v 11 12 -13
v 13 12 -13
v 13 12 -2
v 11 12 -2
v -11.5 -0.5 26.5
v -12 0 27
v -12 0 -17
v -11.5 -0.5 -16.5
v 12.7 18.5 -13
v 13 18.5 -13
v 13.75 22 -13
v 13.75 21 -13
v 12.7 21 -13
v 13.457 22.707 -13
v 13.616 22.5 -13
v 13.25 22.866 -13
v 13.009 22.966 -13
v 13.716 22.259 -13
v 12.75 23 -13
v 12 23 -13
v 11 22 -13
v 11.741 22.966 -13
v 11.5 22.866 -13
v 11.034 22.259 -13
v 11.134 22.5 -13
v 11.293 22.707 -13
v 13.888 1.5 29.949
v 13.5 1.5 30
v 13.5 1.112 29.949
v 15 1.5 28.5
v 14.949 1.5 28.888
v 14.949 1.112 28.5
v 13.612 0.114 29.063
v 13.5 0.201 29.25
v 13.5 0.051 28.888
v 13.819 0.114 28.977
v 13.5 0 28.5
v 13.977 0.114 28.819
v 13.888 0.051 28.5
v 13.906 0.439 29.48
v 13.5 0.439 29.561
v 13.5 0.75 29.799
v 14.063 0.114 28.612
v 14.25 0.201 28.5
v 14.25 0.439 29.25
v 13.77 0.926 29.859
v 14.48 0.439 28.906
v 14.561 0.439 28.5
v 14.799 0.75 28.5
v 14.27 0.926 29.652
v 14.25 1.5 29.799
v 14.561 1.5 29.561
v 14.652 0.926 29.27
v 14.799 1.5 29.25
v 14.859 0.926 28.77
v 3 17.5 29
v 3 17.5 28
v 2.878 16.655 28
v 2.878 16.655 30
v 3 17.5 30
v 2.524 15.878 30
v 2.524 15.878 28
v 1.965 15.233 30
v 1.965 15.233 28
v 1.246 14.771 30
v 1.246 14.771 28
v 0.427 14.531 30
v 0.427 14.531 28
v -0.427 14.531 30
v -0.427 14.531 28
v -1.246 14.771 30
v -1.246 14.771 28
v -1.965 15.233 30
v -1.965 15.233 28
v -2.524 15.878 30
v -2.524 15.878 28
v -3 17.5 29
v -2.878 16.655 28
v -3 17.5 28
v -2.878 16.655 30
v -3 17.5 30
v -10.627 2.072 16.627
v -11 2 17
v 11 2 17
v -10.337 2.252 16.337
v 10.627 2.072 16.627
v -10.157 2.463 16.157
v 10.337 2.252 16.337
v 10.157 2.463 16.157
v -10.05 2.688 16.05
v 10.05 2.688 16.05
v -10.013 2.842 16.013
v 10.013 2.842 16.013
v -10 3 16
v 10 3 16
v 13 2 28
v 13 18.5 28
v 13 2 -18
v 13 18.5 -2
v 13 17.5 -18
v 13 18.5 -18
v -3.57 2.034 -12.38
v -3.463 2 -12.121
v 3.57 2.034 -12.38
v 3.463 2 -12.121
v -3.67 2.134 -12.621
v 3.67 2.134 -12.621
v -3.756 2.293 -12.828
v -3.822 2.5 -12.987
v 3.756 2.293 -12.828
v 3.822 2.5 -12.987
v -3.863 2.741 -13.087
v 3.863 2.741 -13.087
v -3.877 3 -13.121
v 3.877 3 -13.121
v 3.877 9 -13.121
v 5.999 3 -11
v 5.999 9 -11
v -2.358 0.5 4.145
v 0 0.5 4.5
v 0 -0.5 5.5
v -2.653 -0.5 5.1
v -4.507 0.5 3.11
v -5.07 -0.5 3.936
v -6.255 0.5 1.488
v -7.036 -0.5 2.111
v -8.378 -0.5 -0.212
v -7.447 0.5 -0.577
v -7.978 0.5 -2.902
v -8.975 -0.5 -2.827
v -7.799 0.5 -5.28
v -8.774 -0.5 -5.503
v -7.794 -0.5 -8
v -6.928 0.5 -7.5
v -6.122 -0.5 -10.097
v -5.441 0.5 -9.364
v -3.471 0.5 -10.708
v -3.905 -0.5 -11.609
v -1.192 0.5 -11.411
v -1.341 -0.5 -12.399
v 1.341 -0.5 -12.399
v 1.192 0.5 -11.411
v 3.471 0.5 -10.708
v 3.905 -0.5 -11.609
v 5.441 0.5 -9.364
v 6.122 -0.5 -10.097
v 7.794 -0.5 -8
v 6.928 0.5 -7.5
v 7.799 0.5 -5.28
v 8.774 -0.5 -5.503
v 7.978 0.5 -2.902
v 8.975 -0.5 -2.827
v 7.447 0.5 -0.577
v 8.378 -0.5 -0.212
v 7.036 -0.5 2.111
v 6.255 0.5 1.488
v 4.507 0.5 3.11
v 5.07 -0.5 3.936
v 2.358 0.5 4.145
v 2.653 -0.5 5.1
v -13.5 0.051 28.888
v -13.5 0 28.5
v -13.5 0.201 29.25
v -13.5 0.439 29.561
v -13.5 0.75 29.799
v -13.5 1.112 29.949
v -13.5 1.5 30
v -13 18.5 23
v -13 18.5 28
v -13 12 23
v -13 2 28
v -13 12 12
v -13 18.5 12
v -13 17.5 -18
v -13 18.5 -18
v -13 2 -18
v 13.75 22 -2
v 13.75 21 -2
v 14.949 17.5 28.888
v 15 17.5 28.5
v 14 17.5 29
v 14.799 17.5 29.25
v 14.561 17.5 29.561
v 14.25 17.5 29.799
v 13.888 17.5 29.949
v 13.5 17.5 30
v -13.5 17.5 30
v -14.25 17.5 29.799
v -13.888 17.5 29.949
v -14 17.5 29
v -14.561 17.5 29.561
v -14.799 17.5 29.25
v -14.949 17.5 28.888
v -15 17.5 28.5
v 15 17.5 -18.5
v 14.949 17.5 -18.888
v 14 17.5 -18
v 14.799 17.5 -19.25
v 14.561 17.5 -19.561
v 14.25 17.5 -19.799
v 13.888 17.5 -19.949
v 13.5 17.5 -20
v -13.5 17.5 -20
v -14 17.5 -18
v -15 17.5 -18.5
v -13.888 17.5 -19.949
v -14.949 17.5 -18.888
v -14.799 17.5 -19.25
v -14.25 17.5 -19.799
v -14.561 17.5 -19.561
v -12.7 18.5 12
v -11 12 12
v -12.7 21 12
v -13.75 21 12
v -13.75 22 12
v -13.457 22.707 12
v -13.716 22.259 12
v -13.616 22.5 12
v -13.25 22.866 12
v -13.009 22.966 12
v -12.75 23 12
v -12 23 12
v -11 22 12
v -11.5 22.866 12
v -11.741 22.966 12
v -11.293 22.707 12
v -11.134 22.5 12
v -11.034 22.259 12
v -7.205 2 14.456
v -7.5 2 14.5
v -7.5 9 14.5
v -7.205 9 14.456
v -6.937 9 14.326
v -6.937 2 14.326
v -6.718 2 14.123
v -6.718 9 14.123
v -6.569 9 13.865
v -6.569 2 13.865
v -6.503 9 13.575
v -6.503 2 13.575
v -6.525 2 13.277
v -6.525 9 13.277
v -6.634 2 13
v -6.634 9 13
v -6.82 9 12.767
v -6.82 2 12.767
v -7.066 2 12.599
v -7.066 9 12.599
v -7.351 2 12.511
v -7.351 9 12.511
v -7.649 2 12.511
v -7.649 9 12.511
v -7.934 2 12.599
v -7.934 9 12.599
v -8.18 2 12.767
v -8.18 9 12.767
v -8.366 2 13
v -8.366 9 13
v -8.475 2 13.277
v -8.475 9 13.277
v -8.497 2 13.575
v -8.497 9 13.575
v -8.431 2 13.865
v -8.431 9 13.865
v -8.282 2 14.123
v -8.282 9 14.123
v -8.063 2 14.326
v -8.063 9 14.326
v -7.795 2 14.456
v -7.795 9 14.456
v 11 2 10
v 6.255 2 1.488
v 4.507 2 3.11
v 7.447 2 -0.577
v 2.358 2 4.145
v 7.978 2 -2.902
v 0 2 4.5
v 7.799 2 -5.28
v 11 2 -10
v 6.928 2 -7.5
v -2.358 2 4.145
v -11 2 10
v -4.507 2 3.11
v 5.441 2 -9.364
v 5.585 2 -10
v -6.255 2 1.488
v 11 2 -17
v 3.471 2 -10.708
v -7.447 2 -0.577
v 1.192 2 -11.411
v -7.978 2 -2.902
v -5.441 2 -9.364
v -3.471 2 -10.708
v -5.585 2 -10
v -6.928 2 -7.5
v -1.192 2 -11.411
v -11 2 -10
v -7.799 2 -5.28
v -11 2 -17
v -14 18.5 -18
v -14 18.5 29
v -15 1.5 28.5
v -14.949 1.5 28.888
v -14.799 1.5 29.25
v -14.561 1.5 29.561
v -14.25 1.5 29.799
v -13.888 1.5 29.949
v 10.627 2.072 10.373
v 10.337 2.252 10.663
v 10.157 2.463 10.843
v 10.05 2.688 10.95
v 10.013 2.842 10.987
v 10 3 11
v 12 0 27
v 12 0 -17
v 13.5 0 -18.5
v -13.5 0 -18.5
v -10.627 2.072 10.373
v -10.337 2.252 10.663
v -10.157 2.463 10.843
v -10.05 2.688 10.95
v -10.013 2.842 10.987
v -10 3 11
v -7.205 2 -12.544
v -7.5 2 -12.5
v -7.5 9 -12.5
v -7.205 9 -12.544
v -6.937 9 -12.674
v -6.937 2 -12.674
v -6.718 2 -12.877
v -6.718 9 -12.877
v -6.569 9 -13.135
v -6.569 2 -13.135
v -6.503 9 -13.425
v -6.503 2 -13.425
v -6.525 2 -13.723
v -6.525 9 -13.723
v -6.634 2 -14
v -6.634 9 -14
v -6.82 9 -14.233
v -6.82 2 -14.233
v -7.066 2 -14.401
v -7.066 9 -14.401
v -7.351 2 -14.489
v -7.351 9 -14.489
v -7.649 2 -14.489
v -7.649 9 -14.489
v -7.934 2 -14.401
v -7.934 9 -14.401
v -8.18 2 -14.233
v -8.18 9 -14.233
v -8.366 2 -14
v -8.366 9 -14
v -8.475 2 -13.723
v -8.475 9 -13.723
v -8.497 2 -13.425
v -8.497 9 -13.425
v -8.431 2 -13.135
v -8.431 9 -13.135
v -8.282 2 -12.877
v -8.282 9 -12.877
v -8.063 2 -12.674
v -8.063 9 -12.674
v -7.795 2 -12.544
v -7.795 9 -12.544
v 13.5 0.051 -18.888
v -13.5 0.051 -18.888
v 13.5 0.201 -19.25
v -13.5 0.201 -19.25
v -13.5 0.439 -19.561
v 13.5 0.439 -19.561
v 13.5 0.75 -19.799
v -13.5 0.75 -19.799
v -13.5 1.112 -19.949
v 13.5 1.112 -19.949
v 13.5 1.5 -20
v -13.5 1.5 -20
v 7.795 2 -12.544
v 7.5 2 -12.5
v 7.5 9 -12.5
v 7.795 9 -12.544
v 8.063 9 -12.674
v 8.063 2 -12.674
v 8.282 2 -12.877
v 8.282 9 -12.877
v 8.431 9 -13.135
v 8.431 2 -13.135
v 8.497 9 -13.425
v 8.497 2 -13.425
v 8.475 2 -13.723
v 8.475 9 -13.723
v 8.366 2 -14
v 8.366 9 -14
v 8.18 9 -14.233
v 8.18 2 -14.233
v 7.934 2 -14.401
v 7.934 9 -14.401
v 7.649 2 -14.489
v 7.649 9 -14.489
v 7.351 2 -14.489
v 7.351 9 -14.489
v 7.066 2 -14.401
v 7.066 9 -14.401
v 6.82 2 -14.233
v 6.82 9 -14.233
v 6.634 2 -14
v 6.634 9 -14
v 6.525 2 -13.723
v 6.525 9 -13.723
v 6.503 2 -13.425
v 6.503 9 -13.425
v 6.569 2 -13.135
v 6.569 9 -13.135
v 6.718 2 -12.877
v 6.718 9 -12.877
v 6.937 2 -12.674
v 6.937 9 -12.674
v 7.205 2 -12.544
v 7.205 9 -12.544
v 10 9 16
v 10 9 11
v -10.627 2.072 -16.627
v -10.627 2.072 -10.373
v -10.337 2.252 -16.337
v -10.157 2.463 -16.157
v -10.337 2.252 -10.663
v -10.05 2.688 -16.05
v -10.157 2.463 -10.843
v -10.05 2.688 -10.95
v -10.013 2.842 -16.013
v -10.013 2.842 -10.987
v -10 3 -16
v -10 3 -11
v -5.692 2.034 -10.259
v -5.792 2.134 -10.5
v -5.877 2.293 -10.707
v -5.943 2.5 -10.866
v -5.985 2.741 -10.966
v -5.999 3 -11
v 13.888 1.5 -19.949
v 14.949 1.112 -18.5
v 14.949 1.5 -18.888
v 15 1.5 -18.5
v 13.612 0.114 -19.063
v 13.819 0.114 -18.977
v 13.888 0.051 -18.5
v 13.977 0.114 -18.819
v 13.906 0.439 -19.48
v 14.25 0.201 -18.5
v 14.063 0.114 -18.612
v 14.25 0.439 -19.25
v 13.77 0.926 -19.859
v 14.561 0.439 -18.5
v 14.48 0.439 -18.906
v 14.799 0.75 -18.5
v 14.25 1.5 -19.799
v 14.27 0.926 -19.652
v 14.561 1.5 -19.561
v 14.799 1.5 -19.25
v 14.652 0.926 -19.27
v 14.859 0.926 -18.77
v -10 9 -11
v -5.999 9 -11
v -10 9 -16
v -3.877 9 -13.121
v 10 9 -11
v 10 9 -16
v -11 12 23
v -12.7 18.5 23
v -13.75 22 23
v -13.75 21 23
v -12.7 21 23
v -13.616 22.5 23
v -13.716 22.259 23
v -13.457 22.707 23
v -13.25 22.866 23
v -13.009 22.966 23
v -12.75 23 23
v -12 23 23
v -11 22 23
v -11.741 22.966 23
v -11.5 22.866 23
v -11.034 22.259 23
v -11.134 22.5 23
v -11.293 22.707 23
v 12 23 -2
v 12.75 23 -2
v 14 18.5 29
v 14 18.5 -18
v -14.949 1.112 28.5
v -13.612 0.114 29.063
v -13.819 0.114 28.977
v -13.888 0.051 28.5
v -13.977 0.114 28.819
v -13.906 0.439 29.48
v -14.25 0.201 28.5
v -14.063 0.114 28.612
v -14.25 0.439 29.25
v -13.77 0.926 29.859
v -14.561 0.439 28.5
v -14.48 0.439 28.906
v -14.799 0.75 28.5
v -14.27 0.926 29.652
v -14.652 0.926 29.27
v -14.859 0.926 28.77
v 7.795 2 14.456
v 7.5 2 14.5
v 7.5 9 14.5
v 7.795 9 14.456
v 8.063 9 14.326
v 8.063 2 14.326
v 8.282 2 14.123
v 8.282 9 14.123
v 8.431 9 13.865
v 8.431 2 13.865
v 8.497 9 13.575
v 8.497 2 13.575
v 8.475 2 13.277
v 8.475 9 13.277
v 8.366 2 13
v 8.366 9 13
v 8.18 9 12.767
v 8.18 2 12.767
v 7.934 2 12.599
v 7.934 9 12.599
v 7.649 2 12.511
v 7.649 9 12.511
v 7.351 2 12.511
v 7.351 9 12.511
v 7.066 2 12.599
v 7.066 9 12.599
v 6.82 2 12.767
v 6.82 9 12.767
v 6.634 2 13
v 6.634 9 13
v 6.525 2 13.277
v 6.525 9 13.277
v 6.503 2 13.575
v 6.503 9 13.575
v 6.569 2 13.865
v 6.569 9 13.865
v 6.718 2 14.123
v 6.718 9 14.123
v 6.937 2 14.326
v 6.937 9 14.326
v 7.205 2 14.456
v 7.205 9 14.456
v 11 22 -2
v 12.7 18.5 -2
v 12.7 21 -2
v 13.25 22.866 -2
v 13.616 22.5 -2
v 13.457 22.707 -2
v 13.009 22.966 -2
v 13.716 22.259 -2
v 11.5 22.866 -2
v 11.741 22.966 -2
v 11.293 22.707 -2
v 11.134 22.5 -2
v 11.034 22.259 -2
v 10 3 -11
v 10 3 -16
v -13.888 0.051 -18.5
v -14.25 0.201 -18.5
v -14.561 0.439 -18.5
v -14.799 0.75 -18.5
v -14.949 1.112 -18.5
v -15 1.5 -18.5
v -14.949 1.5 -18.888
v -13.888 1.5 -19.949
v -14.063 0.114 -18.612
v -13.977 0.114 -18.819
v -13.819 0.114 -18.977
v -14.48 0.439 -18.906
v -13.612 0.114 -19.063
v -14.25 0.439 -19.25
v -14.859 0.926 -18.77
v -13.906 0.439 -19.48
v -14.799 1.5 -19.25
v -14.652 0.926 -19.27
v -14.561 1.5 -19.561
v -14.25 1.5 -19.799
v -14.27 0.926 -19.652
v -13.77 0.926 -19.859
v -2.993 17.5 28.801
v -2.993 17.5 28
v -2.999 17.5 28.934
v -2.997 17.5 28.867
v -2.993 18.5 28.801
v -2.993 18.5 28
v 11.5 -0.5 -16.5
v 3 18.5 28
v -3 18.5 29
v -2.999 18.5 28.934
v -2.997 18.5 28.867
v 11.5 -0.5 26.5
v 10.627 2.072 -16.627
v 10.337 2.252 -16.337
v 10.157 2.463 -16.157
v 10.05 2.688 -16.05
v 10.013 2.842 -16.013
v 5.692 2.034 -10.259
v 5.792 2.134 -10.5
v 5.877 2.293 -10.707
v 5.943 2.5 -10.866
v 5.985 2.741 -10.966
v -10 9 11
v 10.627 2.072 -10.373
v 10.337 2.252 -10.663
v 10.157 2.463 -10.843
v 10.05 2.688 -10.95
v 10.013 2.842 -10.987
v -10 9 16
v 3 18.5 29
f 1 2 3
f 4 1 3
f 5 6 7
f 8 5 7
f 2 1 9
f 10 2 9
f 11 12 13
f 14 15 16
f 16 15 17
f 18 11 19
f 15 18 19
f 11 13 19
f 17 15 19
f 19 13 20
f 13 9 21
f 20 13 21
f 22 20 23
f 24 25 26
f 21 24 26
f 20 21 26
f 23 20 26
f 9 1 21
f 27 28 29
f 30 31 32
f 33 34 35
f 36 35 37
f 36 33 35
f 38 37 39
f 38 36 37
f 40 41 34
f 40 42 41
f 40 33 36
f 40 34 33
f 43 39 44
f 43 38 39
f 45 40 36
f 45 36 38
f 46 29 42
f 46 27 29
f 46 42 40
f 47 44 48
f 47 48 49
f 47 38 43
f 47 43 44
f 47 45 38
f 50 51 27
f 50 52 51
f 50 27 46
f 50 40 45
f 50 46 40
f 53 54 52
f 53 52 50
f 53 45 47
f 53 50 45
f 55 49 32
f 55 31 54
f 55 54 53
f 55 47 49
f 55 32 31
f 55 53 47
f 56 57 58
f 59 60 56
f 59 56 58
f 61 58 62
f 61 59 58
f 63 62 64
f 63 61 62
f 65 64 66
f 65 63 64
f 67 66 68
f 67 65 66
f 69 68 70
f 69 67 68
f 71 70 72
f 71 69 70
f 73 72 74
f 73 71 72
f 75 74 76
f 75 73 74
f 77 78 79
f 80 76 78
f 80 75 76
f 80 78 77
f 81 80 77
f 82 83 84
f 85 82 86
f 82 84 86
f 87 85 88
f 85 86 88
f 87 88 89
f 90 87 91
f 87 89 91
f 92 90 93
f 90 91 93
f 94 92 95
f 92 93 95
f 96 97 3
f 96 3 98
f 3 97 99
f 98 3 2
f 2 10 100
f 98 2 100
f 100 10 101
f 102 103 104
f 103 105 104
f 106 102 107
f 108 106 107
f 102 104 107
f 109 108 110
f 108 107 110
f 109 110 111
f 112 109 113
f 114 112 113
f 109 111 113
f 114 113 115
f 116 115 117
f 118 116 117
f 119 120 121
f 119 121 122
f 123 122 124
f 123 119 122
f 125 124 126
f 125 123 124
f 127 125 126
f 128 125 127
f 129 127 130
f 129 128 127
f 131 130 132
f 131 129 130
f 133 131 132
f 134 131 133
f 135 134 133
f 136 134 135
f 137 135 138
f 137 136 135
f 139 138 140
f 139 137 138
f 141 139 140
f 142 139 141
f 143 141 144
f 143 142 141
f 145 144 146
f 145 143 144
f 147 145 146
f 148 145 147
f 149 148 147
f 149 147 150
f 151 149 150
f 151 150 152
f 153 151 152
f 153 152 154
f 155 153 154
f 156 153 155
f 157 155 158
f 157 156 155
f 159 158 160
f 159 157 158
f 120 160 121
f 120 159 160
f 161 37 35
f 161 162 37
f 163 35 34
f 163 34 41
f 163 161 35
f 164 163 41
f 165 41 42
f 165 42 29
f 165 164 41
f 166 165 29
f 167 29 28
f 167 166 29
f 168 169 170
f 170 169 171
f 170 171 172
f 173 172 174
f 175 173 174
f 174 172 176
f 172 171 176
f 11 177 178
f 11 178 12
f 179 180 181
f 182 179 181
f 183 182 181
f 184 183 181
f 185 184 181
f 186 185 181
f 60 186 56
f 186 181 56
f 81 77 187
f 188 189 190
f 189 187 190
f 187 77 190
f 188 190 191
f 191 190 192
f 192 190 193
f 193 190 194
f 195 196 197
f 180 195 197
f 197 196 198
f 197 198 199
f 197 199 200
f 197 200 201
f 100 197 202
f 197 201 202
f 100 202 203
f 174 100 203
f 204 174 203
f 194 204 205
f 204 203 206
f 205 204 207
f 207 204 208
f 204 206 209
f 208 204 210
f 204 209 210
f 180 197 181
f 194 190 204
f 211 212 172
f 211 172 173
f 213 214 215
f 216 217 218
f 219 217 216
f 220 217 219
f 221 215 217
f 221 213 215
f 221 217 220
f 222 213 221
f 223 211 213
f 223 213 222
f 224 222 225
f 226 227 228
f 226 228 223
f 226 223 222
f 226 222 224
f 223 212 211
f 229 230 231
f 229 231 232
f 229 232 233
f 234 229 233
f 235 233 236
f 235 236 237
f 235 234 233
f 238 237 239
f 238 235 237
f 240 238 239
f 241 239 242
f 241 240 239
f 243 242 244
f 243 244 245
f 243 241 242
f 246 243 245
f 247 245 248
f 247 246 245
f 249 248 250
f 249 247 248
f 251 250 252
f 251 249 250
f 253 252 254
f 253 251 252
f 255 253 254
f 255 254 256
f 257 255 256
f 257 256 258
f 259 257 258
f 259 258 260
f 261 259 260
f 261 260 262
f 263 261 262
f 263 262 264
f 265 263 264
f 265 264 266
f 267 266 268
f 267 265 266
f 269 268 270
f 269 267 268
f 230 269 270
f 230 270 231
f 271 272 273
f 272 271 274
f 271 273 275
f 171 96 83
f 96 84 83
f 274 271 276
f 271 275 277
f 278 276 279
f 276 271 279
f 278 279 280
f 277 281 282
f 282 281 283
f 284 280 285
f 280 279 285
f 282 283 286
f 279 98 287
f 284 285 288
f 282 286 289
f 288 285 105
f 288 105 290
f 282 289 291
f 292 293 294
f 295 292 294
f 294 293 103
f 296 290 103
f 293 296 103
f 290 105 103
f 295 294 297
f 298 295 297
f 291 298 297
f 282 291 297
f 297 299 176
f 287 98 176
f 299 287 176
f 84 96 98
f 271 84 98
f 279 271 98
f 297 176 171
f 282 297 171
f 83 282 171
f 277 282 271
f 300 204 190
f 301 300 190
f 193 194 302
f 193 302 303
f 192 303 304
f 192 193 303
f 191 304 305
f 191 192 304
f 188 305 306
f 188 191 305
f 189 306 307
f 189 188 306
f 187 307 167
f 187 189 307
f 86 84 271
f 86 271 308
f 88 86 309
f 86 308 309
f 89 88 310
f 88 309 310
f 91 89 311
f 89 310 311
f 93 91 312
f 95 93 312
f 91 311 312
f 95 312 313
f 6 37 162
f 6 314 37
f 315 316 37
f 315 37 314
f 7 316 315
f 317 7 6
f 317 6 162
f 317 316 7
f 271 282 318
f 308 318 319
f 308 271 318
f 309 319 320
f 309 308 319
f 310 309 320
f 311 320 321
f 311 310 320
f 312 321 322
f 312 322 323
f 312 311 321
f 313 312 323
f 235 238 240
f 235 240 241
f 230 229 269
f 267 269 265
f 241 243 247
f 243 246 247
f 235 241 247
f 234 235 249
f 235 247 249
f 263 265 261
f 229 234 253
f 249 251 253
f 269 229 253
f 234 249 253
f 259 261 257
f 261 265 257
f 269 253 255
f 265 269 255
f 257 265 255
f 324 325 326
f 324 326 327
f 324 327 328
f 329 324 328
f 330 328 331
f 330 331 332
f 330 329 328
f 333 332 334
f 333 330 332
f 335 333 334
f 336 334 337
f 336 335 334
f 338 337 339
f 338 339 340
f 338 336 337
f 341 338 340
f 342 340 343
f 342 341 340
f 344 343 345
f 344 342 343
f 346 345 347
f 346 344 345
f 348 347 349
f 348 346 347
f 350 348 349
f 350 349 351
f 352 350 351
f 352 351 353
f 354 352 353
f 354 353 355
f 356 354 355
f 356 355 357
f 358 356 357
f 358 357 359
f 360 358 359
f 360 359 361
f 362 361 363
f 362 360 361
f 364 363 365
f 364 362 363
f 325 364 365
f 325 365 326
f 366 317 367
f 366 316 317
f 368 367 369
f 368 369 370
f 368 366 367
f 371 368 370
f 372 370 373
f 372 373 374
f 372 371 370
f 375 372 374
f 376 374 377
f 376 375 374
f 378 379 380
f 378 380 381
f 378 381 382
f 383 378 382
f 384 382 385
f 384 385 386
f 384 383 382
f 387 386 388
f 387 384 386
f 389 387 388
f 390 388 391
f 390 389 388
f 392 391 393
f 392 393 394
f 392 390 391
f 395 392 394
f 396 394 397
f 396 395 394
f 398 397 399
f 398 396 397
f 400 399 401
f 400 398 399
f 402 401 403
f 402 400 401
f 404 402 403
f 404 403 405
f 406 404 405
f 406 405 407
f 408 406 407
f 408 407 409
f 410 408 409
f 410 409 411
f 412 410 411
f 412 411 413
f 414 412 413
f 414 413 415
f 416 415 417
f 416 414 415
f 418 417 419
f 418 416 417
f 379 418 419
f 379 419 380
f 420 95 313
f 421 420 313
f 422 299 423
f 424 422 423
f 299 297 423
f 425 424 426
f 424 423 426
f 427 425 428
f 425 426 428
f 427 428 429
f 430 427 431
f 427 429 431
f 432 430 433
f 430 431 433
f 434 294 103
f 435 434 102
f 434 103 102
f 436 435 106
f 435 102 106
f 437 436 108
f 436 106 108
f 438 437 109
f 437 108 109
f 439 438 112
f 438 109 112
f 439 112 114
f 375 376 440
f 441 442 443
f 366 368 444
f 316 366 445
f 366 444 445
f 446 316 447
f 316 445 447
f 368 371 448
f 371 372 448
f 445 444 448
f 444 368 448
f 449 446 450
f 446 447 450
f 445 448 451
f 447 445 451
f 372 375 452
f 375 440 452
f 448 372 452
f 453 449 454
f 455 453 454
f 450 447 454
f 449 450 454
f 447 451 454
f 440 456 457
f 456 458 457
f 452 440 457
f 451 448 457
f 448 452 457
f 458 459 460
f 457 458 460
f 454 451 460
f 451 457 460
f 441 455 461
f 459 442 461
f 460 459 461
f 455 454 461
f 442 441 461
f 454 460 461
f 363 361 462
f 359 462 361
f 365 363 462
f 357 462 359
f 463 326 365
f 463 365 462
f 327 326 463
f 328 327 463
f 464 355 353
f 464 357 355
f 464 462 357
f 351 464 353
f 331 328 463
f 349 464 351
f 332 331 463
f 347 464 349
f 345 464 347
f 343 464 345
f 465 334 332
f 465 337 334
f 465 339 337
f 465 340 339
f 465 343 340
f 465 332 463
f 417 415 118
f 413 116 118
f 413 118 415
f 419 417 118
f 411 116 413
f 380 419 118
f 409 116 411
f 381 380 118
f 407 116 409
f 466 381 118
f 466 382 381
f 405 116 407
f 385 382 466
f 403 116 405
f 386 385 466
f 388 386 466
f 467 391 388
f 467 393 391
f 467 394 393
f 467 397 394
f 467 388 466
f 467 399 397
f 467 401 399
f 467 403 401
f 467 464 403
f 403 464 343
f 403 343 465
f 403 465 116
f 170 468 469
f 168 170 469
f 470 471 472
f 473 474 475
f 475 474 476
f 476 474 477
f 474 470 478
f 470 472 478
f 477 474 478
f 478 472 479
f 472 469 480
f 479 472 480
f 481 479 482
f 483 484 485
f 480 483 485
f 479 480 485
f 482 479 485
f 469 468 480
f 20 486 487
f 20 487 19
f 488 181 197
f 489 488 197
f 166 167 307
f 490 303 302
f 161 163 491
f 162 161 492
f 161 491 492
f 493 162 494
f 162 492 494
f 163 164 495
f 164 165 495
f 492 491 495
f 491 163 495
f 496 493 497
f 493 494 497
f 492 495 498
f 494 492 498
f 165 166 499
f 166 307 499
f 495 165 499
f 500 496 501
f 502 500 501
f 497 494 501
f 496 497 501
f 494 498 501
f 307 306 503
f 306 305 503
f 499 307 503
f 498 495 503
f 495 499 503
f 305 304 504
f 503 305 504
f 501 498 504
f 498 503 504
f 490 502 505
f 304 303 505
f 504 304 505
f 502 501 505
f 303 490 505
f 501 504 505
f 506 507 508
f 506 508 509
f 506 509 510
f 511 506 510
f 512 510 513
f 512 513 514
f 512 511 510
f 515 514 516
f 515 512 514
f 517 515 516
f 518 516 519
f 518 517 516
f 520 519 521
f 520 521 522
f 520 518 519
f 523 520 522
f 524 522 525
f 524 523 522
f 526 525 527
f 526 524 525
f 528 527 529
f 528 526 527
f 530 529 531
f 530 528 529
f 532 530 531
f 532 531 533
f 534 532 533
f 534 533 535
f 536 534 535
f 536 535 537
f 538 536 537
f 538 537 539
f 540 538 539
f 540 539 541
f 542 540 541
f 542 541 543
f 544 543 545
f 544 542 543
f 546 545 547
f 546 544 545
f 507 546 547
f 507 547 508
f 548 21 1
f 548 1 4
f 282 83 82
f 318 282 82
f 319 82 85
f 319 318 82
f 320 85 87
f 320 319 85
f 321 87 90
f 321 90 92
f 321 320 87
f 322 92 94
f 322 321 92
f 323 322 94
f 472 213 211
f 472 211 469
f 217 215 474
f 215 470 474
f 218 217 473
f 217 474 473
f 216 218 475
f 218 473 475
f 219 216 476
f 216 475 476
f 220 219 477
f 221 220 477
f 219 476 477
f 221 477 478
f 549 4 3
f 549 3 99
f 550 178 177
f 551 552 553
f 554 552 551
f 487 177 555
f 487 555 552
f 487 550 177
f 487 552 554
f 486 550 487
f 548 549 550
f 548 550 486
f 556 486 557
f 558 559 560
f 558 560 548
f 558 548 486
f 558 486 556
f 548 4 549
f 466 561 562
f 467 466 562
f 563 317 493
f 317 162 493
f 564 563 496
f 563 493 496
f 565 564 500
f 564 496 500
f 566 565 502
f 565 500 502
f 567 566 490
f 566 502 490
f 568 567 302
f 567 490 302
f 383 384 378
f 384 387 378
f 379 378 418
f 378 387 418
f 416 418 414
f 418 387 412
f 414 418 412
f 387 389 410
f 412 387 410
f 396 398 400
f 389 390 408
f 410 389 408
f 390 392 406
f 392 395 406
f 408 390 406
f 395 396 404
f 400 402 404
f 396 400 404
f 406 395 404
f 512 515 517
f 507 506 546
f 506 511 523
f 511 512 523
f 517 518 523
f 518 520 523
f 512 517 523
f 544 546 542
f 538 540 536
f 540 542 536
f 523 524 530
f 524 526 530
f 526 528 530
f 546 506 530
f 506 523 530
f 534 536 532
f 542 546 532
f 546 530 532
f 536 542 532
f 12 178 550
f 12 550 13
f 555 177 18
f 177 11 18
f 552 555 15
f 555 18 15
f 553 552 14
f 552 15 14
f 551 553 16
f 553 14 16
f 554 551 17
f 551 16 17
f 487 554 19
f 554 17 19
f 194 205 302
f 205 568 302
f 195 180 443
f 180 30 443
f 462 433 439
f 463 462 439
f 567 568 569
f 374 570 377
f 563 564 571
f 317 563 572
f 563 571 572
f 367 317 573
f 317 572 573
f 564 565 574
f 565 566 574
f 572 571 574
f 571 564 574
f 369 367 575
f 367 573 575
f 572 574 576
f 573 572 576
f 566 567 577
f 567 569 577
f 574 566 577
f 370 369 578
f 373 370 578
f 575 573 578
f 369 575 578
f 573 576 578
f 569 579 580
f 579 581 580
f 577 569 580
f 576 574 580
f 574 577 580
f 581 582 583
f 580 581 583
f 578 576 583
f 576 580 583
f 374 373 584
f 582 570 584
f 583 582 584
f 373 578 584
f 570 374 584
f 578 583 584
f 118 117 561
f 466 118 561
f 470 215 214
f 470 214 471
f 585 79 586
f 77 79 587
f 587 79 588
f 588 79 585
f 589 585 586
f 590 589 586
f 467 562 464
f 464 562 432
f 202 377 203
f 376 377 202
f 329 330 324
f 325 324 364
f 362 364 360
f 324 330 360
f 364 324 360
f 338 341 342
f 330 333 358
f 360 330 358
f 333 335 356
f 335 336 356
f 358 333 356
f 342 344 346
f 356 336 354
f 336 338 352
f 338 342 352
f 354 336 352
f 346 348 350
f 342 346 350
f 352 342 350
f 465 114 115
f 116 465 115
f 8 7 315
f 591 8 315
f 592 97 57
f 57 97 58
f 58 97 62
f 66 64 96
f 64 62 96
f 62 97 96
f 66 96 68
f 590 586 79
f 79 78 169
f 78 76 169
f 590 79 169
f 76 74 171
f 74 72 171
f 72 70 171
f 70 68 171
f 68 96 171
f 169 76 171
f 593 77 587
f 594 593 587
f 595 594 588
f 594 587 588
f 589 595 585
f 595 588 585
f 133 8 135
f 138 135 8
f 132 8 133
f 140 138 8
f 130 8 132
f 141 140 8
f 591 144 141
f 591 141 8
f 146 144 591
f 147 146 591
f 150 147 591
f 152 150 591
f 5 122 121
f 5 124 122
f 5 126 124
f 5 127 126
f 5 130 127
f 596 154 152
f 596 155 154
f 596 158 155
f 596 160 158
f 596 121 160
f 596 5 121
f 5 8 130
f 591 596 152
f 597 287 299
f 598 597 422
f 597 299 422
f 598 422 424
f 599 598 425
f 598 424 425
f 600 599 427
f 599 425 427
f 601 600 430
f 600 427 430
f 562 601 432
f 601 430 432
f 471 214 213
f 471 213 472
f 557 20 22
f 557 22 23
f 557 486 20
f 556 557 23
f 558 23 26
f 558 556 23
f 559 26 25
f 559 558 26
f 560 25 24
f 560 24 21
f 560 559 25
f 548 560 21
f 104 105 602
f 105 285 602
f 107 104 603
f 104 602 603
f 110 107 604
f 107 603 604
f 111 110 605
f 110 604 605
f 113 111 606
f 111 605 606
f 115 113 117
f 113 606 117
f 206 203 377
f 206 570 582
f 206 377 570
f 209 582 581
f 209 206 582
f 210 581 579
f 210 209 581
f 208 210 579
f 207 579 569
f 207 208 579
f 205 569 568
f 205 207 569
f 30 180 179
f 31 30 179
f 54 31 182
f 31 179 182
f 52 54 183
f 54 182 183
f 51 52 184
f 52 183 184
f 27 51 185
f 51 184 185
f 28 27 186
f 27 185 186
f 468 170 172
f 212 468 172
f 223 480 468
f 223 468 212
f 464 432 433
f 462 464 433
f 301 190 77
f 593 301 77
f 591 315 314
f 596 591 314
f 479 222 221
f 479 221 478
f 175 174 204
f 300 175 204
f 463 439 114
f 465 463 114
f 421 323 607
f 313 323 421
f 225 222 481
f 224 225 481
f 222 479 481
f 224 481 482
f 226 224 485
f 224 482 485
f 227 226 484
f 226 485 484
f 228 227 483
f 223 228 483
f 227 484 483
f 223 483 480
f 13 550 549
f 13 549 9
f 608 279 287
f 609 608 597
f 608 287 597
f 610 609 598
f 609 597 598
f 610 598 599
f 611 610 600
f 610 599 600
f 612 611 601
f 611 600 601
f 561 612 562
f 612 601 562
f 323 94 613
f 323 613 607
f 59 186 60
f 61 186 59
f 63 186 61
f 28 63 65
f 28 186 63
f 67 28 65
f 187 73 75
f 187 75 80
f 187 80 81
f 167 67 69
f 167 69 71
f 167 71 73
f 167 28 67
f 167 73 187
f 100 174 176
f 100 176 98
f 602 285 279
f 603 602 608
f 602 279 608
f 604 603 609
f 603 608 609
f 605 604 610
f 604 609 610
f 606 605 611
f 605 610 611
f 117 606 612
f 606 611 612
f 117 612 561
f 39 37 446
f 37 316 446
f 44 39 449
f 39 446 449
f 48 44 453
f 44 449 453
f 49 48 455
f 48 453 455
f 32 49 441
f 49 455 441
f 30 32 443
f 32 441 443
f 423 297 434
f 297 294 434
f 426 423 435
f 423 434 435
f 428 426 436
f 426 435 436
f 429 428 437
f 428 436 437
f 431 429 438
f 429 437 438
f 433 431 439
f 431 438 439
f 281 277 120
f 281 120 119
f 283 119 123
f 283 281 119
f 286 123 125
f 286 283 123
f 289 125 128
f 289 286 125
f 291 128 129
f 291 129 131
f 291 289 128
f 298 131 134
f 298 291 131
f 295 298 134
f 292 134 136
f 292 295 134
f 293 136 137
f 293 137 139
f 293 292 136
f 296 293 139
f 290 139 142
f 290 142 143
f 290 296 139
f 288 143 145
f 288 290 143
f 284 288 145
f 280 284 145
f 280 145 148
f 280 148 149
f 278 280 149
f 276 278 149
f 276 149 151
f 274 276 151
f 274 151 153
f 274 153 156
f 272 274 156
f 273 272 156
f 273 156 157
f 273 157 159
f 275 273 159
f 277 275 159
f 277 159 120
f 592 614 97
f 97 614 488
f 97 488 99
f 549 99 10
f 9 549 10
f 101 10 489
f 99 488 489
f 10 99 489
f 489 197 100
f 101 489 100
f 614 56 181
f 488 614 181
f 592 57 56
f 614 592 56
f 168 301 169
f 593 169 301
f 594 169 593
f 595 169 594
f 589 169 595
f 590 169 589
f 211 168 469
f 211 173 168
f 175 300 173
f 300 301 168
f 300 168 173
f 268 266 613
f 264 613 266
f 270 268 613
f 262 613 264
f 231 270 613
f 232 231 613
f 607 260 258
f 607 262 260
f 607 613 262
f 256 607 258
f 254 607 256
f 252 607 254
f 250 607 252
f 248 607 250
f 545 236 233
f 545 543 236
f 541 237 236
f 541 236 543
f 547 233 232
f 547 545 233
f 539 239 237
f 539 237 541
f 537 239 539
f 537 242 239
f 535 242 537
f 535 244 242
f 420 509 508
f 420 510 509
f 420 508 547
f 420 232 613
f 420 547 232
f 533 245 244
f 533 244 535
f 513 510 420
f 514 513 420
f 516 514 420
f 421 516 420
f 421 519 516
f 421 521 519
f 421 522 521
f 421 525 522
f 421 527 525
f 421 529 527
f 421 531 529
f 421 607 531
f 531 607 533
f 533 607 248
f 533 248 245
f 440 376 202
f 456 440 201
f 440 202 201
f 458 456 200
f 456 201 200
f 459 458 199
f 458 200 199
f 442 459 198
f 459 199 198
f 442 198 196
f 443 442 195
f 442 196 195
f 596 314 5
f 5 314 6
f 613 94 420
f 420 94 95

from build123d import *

# Parameters (mm, degrees)
BOSS_EXTRUDE1_DEPTH  = 17.5
CUT_EXTRUDE1_DEPTH   = 15.5
CUT_EXTRUDE3_REACH   = 38.949
SKETCH4_R            = 8
SKETCH4_4_R          = 1
SKETCH4_4_W          = 20
SKETCH4_4_H          = 5
BOSS_EXTRUDE2_DEPTH  = 7
FILLET1_R            = 1
FILLET2_R            = 1.5
BOSS_EXTRUDE3_DEPTH  = 2
SKETCH6_W            = 11
SKETCH6_H            = 2
BOSS_EXTRUDE4_DEPTH  = 0.75
SKETCH11_R           = 8
BOSS_EXTRUDE11_DEPTH = 0.5
SKETCH14_W           = 11
SKETCH14_H           = 11
BOSS_EXTRUDE12_DEPTH = 2
BOSS_EXTRUDE13_DEPTH = 1
SKETCH6_4_W          = 11
SKETCH6_4_H          = 2.5
CUT_EXTRUDE6_DEPTH   = 0.3
SKETCH16_W           = 11
SKETCH16_H           = 2
BOSS_EXTRUDE14_DEPTH = 0.75
SKETCH16_3_W         = 11
SKETCH16_3_H         = 2.5
CUT_EXTRUDE7_DEPTH   = 0.3
CUT_EXTRUDE8_REACH   = 59.044
FILLET3_R            = 1
CHAMFER1_SIZE        = 0.5
CHAMFER3_SIZE        = 1


with BuildPart() as part:
    # Sketch1 → Boss-Extrude1 (new body)
    with BuildSketch(Plane(origin=(0, 0, 0), x_dir=(1, 0, 0), z_dir=(0, 1, 0))):
        Polygon((-15, 20), (15, 20), (15, -20), (15, -30), (-15, -30), (-15, -20), align=None)
    extrude(amount=BOSS_EXTRUDE1_DEPTH)

    # Sketch2 → Cut-Extrude1 (cut)
    with BuildSketch(Plane(origin=(0, 17.5, 0), x_dir=(1, 0, 0), z_dir=(0, 1, 0))):
        Polygon((-13, 18), (13, 18), (13, -18), (13, -28), (-13, -28), (-13, -18), align=None)
    extrude(amount=-CUT_EXTRUDE1_DEPTH, mode=Mode.SUBTRACT)

    # Sketch4 → Cut-Extrude3 (cut, up to next)
    with BuildSketch(Plane(origin=(0, 2, 0), x_dir=(1, 0, 0), z_dir=(0, 1, 0)), mode=Mode.PRIVATE) as cut_extrude3_sk1:
        with Locations(Location((0, 3.5, 0), (0, 0, 270))):
            Circle(SKETCH4_R)
    cut_extrude3_tool1 = extrude(cut_extrude3_sk1.sketch, amount=-CUT_EXTRUDE3_REACH, mode=Mode.PRIVATE) & part.part
    add(cut_extrude3_tool1.solids().sort_by_distance((0, 2, -3.5))[0], mode=Mode.SUBTRACT)

    # Sketch4<4> → Boss-Extrude2 (add)
    # profile 1 of 2: a face of its own
    with BuildSketch(Plane(origin=(0, 2, 0), x_dir=(1, 0, 0), z_dir=(0, 1, 0))):
        Polygon((10, 16), (-10, 16), (-10, 11), (-5.998750655, 11), (-3.877430311, 13.121320344), (3.877430311, 13.121320344), (5.998750655, 11), (10, 11), align=None)
        with Locations(Location((-7.5, 13.5, 0), (0, 0, 270))):
            Circle(SKETCH4_4_R, mode=Mode.SUBTRACT)
        with Locations(Location((7.5, 13.5, 0), (0, 0, 270))):
            Circle(SKETCH4_4_R, mode=Mode.SUBTRACT)
    # profile 2 of 2: a face of its own
    with BuildSketch(Plane(origin=(0, 2, 0), x_dir=(1, 0, 0), z_dir=(0, 1, 0))):
        with Locations((0, -13.5)):
            Rectangle(SKETCH4_4_W, SKETCH4_4_H)
        with Locations(Location((7.5, -13.5, 0), (0, 0, 270))):
            Circle(SKETCH4_4_R, mode=Mode.SUBTRACT)
        with Locations(Location((-7.5, -13.5, 0), (0, 0, 270))):
            Circle(SKETCH4_4_R, mode=Mode.SUBTRACT)
    extrude(amount=BOSS_EXTRUDE2_DEPTH)

    # Fillet1
    fillet1_edges = [part.edges().sort_by_distance(p)[0] for p in [
        (-4.938090483, 2, -12.060660172),
        (0, 2, -13.121320344),
        (-10, 2, -13.5),
        (-7.999375327, 2, -11),
        (0, 2, -16),
        (10, 2, -13.5),
        (7.999375327, 2, -11),
        (4.938090483, 2, -12.060660172),
        (-10, 2, 13.5),
        (0, 2, 16),
        (0, 2, 11),
        (10, 2, 13.5),
    ]]
    fillet(fillet1_edges, radius=FILLET1_R)

    # Fillet2
    fillet2_edges = [part.edges().sort_by_distance(p)[0] for p in [
        (15, 8.75, 30),
        (-15, 8.75, 30),
        (-15, 8.75, -20),
        (15, 8.75, -20),
        (0, 0, 30),
        (-15, 0, 5),
        (0, 0, -20),
        (15, 0, 5),
    ]]
    fillet(fillet2_edges, radius=FILLET2_R)

    # Sketch5 → Boss-Extrude3 (add)
    with BuildSketch(Plane(origin=(-13, 0, 0), x_dir=(0, 0, -1), z_dir=(1, 0, 0))):
        Polygon((-12, 17.5), (-18, 17.5), (-23, 17.5), (-23, 12), (-12, 12), align=None)
        Polygon((-23, 17.5), (-18, 17.5), (-12, 17.5), (-12, 23), (-23, 23), align=None)
    extrude(amount=BOSS_EXTRUDE3_DEPTH)

    # Sketch6 → Boss-Extrude4 (add)
    with BuildSketch(Plane.ZY.offset(13)):
        with Locations((17.5, 22)):
            Rectangle(SKETCH6_W, SKETCH6_H)
    extrude(amount=BOSS_EXTRUDE4_DEPTH)

    # Sketch11 → Boss-Extrude11 (add)
    with BuildSketch(Plane.XZ):
        Polygon((-12, 17), (-12, -17), (12, -17), (12, 17), (12, 27), (-12, 27), align=None)
        with Locations(Location((0, -3.5, 0), (0, 0, 90))):
            Circle(SKETCH11_R, mode=Mode.SUBTRACT)
    extrude(amount=BOSS_EXTRUDE11_DEPTH)

    # Sketch14 → Boss-Extrude12 (add)
    with BuildSketch(Plane.ZY.offset(-13)):
        with Locations((-7.5, 17.5)):
            Rectangle(SKETCH14_W, SKETCH14_H)
    extrude(amount=BOSS_EXTRUDE12_DEPTH)

    # Sketch15 → Boss-Extrude13 (add)
    with BuildSketch(Plane(origin=(0, 17.5, 0), x_dir=(1, 0, 0), z_dir=(0, 1, 0))):
        with BuildLine():
            Line((-13, -28), (-13, 18))
            Line((-13, 18), (-14, 18))
            Line((-14, 18), (-14, -29))
            Line((-14, -29), (-3, -29))
            ThreePointArc((-3, -29), (-2.998349642, -28.900504153), (-2.993400384, -28.801117774))
            Line((-2.993400384, -28.801117774), (-2.993400384, -28))
            Line((-2.993400384, -28), (-13, -28))
        make_face()
        Polygon((14, 18), (13, 18), (13, -28), (3, -28), (3, -29), (14, -29), align=None)
    extrude(amount=BOSS_EXTRUDE13_DEPTH)

    # Sketch6<4> → Cut-Extrude6 (cut)
    with BuildSketch(Plane.ZY.offset(13)):
        with Locations((17.5, 19.75)):
            Rectangle(SKETCH6_4_W, SKETCH6_4_H)
    extrude(amount=-CUT_EXTRUDE6_DEPTH, mode=Mode.SUBTRACT)

    # Sketch16 → Boss-Extrude14 (add)
    with BuildSketch(Plane(origin=(13, 0, 0), x_dir=(0, 0, -1), z_dir=(1, 0, 0))):
        with Locations((7.5, 22)):
            Rectangle(SKETCH16_W, SKETCH16_H)
    extrude(amount=BOSS_EXTRUDE14_DEPTH)

    # Sketch16<3> → Cut-Extrude7 (cut)
    with BuildSketch(Plane(origin=(13, 0, 0), x_dir=(0, 0, -1), z_dir=(1, 0, 0))):
        with Locations((7.5, 19.75)):
            Rectangle(SKETCH16_3_W, SKETCH16_3_H)
    extrude(amount=-CUT_EXTRUDE7_DEPTH, mode=Mode.SUBTRACT)

    # Sketch17 → Cut-Extrude8 (cut, up to next)
    with BuildSketch(Plane.XY.offset(30), mode=Mode.PRIVATE) as cut_extrude8_sk1:
        with BuildLine():
            Line((-3, 17.5), (3, 17.5))
            ThreePointArc((3, 17.5), (0, 14.5), (-3, 17.5))
        make_face()
    cut_extrude8_tool1 = extrude(cut_extrude8_sk1.sketch, amount=-CUT_EXTRUDE8_REACH, mode=Mode.PRIVATE) & part.part
    add(cut_extrude8_tool1.solids().sort_by_distance((0, 16.22676, 30))[0], mode=Mode.SUBTRACT)

    # Fillet3
    fillet3_edges = [part.edges().sort_by_distance(p)[0] for p in [
        (-11, 23, 17.5),
        (-13.75, 23, 17.5),
        (11, 23, -7.5),
        (13.75, 23, -7.5),
    ]]
    fillet(fillet3_edges, radius=FILLET3_R)

    # Chamfer1
    chamfer1_edges = [part.edges().sort_by_distance(p)[0] for p in [
        (0, -0.5, 27),
        (12, -0.5, 5),
        (-12, -0.5, 5),
        (0, -0.5, -17),
    ]]
    chamfer(chamfer1_edges, length=CHAMFER1_SIZE - 0.0001)  # a hair under: the kernel refuses the full size

    # Chamfer3
    chamfer3_edges = [part.edges().sort_by_distance(p)[0] for p in [
        (0, -0.5, -11.5),
    ]]
    chamfer(chamfer3_edges, length=CHAMFER3_SIZE)


solid = part.part
